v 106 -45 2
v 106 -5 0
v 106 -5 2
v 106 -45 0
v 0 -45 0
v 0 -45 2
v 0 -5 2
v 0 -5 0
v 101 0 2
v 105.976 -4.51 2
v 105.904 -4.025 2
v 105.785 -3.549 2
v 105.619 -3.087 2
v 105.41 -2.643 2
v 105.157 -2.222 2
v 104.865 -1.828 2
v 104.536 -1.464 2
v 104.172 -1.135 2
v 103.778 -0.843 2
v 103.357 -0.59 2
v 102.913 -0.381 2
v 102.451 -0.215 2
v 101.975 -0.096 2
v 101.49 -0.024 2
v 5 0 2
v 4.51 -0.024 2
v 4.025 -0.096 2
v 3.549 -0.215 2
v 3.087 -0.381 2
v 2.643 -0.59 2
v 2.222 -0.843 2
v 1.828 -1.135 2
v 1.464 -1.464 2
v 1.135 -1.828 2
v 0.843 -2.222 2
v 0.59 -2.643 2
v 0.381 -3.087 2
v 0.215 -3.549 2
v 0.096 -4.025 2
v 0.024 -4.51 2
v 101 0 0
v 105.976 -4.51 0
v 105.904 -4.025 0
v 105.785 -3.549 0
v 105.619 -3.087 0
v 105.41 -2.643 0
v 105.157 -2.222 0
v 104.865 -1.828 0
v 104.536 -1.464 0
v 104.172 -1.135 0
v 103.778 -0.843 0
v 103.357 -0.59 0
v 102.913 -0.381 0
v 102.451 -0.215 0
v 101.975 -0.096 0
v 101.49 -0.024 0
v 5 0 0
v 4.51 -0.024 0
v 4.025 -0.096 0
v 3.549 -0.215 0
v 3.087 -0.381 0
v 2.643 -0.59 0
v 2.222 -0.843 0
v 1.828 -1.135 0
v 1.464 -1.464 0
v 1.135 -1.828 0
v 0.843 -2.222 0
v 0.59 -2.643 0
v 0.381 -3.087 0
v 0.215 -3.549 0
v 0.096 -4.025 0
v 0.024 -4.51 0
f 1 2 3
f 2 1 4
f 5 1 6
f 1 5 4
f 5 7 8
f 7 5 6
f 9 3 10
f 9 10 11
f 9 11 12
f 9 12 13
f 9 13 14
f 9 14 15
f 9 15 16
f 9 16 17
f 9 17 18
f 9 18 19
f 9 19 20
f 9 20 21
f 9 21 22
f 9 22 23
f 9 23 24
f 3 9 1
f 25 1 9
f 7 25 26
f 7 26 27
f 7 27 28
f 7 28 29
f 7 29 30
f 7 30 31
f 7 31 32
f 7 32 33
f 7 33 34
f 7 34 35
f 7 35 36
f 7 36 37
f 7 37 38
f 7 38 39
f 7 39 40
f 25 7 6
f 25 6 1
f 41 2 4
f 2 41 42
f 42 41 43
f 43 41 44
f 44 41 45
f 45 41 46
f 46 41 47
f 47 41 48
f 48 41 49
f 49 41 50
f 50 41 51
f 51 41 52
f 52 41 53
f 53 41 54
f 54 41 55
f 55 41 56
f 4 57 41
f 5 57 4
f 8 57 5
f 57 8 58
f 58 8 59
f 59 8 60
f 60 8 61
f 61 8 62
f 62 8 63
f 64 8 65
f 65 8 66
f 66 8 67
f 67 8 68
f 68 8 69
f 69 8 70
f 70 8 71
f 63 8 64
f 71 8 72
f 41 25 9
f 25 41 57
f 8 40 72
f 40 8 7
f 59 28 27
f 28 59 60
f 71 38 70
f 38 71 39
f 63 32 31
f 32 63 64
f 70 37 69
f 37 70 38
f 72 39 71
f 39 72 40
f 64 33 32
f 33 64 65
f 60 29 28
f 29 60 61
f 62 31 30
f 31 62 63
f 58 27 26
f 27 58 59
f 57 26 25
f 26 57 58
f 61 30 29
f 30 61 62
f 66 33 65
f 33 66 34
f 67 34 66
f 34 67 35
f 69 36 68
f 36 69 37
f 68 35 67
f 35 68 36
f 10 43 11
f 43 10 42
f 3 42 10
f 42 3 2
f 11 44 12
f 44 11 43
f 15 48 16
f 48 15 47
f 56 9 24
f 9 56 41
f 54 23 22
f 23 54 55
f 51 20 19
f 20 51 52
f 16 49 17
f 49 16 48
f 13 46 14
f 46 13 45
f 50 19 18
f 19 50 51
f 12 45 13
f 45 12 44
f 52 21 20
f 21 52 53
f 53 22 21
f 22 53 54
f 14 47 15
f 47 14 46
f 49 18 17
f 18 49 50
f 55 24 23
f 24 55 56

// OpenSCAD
$fn = 64;

dx = 106;
dy =   2;
dz =  45;

r = 5;

rotate([90, 0, 0]) {
  translate([0, 0, r])
    cube([dx, dy, dz - r]);
  translate([r, 0, 0])
    cube([dx - r - r, dy, r]);
  translate([r, 0, r])
    rotate([-90, 0, 0])
      cylinder(r = r, h = dy);
  translate([dx - r, 0, r])
    rotate([-90, 0, 0])
      cylinder(r = r, h = dy);
}
